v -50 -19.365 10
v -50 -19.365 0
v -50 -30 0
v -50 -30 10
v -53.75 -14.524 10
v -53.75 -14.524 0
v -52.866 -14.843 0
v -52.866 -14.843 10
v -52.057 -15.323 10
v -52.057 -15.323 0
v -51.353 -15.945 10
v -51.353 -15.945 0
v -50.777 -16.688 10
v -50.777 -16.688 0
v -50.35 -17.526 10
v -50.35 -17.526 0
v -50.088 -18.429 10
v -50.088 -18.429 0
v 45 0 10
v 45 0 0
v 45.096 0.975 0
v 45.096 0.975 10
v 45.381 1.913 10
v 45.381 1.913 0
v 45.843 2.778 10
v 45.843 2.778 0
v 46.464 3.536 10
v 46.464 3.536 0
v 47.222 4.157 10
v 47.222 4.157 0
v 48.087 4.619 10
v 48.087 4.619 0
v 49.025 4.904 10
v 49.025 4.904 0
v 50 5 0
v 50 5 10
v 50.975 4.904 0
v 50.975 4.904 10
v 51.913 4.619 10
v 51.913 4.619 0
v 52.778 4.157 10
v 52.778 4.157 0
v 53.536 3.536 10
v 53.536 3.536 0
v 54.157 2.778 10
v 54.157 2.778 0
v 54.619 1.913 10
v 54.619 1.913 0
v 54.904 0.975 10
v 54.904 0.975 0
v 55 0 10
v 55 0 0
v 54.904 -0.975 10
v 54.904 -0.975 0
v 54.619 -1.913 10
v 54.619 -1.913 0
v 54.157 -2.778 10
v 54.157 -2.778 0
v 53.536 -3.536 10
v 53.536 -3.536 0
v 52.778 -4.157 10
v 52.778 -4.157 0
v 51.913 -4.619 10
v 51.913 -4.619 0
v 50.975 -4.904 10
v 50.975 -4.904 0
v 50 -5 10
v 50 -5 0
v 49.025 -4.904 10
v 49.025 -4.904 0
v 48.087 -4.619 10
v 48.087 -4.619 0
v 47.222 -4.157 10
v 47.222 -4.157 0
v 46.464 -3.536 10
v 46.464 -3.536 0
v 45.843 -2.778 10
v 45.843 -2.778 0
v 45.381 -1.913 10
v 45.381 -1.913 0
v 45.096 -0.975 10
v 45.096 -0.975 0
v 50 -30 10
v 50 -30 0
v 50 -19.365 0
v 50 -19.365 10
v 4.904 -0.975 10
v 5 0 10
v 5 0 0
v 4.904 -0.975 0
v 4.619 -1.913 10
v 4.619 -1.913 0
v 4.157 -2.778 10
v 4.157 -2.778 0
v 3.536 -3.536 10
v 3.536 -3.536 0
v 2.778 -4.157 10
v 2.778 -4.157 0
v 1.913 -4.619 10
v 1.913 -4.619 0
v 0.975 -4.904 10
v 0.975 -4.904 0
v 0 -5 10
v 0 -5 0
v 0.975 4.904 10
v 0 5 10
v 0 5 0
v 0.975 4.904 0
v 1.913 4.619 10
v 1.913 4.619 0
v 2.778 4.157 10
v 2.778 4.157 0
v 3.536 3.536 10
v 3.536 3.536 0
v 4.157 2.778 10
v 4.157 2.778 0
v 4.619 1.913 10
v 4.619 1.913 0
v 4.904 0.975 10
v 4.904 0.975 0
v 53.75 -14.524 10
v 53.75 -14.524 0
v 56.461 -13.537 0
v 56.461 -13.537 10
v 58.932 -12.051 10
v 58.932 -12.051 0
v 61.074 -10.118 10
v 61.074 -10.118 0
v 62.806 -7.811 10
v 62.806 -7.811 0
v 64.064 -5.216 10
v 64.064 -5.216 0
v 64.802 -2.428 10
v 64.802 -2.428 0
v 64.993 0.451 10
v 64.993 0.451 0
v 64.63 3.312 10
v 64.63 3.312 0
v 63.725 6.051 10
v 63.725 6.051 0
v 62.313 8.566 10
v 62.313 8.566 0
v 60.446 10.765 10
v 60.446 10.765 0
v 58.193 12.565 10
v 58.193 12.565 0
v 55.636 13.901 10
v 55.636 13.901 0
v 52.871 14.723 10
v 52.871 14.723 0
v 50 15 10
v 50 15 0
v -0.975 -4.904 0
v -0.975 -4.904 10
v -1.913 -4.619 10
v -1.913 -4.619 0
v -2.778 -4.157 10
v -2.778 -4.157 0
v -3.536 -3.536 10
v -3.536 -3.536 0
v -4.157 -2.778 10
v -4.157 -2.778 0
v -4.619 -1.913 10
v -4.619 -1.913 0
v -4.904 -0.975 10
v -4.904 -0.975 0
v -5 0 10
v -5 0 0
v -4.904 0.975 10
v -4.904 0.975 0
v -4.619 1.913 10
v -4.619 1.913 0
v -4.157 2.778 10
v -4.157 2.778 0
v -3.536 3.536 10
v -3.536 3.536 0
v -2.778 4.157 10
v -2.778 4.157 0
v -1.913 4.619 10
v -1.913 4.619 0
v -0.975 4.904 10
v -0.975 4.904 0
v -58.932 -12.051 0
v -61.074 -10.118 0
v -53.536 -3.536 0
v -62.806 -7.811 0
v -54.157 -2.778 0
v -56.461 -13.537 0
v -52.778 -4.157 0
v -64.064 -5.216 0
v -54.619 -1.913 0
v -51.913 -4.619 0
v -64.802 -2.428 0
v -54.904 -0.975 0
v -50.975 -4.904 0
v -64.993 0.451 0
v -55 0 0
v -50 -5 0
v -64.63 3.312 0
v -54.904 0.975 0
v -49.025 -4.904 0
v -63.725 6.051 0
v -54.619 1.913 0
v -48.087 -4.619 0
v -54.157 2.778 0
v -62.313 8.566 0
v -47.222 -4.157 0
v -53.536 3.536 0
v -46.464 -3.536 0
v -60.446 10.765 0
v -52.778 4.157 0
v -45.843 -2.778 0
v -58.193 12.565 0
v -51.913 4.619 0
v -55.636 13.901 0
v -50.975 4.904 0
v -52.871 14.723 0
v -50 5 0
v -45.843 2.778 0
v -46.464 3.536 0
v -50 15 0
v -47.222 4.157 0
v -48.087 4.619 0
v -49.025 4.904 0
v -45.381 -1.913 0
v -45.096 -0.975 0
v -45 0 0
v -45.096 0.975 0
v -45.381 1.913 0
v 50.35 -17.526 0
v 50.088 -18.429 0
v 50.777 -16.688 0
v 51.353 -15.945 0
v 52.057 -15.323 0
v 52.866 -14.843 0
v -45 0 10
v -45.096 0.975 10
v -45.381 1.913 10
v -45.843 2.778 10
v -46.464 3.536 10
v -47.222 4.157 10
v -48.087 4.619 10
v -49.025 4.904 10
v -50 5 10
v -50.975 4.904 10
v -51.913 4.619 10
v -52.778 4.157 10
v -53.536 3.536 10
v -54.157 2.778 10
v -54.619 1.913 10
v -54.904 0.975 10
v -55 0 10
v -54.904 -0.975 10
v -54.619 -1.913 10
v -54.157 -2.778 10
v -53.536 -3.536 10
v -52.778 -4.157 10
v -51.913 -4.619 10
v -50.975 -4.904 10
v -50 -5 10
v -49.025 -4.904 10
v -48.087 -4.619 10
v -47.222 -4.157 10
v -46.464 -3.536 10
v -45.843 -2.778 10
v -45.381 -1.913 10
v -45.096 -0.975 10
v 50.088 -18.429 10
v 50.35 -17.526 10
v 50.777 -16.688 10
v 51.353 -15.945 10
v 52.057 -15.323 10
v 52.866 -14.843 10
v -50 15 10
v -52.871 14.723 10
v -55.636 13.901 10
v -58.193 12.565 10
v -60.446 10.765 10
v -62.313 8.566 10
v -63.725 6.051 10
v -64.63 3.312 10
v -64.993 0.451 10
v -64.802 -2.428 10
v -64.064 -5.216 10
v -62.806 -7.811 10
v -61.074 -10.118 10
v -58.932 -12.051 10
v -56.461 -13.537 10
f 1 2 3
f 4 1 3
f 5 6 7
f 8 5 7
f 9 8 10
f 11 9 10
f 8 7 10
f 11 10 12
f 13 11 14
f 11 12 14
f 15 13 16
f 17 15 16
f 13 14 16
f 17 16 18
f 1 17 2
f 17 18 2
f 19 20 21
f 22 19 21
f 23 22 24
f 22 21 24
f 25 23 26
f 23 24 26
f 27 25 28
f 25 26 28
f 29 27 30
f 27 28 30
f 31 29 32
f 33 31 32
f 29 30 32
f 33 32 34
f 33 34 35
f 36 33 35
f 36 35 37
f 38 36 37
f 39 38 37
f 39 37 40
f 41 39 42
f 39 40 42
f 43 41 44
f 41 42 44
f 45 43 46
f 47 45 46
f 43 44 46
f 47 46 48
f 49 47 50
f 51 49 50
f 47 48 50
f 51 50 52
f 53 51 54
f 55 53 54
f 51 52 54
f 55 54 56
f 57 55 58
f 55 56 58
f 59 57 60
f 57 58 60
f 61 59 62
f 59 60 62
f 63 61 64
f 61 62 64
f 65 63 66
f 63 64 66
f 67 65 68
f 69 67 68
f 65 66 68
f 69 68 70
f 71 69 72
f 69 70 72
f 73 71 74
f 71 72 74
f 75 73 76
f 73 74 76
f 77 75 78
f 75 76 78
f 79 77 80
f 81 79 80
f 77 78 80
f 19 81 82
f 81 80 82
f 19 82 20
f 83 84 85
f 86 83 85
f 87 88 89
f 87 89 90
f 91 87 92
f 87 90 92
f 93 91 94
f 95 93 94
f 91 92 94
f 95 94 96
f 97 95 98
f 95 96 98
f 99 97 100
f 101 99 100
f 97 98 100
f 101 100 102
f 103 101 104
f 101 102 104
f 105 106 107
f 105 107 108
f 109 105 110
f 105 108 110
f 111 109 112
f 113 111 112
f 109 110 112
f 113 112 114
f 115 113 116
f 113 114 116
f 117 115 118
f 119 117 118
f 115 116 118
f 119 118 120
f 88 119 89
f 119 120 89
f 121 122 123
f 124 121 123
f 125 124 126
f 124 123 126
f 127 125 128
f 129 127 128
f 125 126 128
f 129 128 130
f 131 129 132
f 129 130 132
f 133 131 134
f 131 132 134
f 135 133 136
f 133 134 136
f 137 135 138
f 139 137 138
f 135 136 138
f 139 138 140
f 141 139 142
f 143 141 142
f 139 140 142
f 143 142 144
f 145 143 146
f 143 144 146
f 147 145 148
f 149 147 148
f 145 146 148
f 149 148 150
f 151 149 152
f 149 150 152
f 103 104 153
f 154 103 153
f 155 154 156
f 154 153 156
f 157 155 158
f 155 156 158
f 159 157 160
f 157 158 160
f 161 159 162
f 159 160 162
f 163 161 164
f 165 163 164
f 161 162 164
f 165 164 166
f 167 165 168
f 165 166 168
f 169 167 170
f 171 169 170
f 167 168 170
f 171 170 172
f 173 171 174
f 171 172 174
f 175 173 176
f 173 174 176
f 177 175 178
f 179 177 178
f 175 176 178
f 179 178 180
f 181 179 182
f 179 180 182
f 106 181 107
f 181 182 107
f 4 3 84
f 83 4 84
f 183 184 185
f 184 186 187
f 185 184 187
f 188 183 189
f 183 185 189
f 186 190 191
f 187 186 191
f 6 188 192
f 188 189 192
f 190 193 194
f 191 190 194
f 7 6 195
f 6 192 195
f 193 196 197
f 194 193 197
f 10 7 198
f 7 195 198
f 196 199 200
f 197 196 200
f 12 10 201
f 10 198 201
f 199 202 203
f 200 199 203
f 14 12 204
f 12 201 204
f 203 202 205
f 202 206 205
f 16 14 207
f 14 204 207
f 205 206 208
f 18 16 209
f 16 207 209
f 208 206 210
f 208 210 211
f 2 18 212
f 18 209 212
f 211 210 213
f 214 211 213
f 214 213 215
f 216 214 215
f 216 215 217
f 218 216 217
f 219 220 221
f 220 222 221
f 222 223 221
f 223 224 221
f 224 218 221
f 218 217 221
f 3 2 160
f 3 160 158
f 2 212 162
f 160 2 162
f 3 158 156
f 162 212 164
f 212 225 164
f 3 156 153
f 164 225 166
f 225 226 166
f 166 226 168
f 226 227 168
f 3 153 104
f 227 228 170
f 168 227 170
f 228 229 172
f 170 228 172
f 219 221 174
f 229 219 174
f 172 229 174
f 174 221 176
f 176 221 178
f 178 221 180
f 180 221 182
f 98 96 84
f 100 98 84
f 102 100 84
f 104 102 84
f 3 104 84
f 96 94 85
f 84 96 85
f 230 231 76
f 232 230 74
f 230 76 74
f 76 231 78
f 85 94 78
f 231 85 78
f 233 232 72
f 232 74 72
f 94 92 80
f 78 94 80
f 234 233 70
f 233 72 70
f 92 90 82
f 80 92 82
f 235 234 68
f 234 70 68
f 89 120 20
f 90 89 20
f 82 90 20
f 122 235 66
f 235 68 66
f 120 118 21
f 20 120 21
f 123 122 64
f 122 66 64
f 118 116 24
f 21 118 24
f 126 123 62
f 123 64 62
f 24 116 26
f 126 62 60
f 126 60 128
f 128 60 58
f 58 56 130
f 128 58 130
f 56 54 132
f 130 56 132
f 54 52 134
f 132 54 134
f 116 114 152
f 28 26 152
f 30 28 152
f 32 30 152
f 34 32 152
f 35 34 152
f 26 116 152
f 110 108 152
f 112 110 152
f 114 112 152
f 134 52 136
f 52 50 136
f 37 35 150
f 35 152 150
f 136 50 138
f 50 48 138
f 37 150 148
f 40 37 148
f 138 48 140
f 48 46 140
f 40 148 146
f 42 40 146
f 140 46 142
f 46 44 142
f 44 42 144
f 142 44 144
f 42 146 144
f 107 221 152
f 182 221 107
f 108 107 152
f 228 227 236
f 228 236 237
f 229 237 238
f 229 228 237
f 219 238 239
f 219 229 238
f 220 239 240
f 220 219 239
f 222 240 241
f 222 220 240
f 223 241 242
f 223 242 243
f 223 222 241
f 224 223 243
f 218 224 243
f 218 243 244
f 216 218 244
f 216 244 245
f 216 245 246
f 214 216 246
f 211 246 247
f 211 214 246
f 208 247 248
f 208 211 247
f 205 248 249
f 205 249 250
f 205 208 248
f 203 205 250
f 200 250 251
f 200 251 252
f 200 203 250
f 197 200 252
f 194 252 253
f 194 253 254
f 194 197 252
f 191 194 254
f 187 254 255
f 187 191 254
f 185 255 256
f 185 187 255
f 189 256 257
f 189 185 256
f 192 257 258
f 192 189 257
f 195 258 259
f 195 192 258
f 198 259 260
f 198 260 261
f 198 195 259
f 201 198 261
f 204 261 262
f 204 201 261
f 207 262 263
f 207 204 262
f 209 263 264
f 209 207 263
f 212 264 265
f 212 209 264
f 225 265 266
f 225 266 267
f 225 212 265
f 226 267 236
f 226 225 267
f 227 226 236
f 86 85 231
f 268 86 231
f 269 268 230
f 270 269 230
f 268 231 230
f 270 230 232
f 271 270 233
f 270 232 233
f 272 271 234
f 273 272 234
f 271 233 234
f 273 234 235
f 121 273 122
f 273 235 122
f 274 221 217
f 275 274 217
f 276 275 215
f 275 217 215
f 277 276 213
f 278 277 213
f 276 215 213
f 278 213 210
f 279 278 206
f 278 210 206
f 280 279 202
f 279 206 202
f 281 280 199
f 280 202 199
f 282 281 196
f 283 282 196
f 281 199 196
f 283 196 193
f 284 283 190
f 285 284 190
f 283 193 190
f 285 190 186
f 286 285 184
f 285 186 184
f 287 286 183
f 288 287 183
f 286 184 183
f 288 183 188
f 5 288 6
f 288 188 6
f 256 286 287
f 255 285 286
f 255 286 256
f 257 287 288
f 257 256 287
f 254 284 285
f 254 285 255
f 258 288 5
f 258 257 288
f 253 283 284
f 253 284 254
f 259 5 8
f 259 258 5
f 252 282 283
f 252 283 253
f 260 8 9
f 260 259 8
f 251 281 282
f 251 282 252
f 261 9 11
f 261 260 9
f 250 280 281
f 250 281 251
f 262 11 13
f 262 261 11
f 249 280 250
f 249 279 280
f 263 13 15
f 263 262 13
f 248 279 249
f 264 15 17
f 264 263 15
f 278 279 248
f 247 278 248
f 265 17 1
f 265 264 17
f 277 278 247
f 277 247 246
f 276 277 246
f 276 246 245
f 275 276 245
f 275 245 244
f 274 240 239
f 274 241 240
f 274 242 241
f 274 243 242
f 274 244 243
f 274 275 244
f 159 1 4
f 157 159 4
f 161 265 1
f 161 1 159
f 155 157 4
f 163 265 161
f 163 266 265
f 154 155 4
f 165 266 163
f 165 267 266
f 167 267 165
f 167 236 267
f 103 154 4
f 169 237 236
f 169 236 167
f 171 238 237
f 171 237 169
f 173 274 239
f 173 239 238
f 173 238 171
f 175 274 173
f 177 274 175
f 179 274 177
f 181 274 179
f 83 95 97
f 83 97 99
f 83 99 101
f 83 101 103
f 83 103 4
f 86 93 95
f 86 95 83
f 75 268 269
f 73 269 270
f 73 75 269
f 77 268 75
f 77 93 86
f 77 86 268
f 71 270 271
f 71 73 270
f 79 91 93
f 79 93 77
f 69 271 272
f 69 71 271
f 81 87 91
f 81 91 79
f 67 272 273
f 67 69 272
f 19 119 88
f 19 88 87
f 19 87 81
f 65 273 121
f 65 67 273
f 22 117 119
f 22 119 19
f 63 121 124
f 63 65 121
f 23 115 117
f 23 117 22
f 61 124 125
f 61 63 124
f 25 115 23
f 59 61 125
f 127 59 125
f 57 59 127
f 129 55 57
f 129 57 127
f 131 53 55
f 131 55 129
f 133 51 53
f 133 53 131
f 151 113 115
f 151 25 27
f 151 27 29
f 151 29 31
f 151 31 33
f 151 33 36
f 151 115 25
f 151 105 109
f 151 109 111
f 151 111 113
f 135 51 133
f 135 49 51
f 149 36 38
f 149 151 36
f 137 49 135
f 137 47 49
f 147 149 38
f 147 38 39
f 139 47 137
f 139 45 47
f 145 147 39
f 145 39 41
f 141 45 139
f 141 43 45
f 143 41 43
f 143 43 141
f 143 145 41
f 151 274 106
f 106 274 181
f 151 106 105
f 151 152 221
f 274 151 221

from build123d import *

# Parameters (mm, degrees)
F0_R     = 5
F1_DEPTH = 10


with BuildPart() as f1:
    # F0 (on Top) → F1 (new body)
    with BuildSketch(Plane.XY):
        with BuildLine():
            Line((0, 15), (-50, 15))
            ThreePointArc((-50, 15), (-64.880445, 1.890064), (-53.75, -14.523688))
            ThreePointArc((-53.75, -14.523688), (-51.047153, -16.303055), (-50, -19.364917))
            Line((-50, -19.364917), (-50, -30))
            Line((-50, -30), (0, -30))
            Line((0, -30), (0, -5))
            ThreePointArc((0, -5), (-5, 0), (0, 5))
            Line((0, 5), (0, 15))
        make_face()
        with Locations((-50, 0)):
            Circle(F0_R, mode=Mode.SUBTRACT)
        with BuildLine():
            Line((50, 15), (0, 15))
            Line((0, 15), (0, 5))
            ThreePointArc((0, 5), (3.535534, 3.535534), (5, 0))
            ThreePointArc((5, 0), (3.535534, -3.535534), (0, -5))
            Line((0, -5), (0, -30))
            Line((0, -30), (50, -30))
            Line((50, -30), (50, -19.364917))
            ThreePointArc((50, -19.364917), (51.047153, -16.303055), (53.75, -14.523688))
            ThreePointArc((53.75, -14.523688), (64.880445, 1.890064), (50, 15))
        make_face()
        with BuildLine():
            ThreePointArc((55, 0), (50, -5), (45, 0))
            ThreePointArc((45, 0), (50, 5), (55, 0))
        make_face(mode=Mode.SUBTRACT)
    extrude(amount=F1_DEPTH)


solid = f1.part
